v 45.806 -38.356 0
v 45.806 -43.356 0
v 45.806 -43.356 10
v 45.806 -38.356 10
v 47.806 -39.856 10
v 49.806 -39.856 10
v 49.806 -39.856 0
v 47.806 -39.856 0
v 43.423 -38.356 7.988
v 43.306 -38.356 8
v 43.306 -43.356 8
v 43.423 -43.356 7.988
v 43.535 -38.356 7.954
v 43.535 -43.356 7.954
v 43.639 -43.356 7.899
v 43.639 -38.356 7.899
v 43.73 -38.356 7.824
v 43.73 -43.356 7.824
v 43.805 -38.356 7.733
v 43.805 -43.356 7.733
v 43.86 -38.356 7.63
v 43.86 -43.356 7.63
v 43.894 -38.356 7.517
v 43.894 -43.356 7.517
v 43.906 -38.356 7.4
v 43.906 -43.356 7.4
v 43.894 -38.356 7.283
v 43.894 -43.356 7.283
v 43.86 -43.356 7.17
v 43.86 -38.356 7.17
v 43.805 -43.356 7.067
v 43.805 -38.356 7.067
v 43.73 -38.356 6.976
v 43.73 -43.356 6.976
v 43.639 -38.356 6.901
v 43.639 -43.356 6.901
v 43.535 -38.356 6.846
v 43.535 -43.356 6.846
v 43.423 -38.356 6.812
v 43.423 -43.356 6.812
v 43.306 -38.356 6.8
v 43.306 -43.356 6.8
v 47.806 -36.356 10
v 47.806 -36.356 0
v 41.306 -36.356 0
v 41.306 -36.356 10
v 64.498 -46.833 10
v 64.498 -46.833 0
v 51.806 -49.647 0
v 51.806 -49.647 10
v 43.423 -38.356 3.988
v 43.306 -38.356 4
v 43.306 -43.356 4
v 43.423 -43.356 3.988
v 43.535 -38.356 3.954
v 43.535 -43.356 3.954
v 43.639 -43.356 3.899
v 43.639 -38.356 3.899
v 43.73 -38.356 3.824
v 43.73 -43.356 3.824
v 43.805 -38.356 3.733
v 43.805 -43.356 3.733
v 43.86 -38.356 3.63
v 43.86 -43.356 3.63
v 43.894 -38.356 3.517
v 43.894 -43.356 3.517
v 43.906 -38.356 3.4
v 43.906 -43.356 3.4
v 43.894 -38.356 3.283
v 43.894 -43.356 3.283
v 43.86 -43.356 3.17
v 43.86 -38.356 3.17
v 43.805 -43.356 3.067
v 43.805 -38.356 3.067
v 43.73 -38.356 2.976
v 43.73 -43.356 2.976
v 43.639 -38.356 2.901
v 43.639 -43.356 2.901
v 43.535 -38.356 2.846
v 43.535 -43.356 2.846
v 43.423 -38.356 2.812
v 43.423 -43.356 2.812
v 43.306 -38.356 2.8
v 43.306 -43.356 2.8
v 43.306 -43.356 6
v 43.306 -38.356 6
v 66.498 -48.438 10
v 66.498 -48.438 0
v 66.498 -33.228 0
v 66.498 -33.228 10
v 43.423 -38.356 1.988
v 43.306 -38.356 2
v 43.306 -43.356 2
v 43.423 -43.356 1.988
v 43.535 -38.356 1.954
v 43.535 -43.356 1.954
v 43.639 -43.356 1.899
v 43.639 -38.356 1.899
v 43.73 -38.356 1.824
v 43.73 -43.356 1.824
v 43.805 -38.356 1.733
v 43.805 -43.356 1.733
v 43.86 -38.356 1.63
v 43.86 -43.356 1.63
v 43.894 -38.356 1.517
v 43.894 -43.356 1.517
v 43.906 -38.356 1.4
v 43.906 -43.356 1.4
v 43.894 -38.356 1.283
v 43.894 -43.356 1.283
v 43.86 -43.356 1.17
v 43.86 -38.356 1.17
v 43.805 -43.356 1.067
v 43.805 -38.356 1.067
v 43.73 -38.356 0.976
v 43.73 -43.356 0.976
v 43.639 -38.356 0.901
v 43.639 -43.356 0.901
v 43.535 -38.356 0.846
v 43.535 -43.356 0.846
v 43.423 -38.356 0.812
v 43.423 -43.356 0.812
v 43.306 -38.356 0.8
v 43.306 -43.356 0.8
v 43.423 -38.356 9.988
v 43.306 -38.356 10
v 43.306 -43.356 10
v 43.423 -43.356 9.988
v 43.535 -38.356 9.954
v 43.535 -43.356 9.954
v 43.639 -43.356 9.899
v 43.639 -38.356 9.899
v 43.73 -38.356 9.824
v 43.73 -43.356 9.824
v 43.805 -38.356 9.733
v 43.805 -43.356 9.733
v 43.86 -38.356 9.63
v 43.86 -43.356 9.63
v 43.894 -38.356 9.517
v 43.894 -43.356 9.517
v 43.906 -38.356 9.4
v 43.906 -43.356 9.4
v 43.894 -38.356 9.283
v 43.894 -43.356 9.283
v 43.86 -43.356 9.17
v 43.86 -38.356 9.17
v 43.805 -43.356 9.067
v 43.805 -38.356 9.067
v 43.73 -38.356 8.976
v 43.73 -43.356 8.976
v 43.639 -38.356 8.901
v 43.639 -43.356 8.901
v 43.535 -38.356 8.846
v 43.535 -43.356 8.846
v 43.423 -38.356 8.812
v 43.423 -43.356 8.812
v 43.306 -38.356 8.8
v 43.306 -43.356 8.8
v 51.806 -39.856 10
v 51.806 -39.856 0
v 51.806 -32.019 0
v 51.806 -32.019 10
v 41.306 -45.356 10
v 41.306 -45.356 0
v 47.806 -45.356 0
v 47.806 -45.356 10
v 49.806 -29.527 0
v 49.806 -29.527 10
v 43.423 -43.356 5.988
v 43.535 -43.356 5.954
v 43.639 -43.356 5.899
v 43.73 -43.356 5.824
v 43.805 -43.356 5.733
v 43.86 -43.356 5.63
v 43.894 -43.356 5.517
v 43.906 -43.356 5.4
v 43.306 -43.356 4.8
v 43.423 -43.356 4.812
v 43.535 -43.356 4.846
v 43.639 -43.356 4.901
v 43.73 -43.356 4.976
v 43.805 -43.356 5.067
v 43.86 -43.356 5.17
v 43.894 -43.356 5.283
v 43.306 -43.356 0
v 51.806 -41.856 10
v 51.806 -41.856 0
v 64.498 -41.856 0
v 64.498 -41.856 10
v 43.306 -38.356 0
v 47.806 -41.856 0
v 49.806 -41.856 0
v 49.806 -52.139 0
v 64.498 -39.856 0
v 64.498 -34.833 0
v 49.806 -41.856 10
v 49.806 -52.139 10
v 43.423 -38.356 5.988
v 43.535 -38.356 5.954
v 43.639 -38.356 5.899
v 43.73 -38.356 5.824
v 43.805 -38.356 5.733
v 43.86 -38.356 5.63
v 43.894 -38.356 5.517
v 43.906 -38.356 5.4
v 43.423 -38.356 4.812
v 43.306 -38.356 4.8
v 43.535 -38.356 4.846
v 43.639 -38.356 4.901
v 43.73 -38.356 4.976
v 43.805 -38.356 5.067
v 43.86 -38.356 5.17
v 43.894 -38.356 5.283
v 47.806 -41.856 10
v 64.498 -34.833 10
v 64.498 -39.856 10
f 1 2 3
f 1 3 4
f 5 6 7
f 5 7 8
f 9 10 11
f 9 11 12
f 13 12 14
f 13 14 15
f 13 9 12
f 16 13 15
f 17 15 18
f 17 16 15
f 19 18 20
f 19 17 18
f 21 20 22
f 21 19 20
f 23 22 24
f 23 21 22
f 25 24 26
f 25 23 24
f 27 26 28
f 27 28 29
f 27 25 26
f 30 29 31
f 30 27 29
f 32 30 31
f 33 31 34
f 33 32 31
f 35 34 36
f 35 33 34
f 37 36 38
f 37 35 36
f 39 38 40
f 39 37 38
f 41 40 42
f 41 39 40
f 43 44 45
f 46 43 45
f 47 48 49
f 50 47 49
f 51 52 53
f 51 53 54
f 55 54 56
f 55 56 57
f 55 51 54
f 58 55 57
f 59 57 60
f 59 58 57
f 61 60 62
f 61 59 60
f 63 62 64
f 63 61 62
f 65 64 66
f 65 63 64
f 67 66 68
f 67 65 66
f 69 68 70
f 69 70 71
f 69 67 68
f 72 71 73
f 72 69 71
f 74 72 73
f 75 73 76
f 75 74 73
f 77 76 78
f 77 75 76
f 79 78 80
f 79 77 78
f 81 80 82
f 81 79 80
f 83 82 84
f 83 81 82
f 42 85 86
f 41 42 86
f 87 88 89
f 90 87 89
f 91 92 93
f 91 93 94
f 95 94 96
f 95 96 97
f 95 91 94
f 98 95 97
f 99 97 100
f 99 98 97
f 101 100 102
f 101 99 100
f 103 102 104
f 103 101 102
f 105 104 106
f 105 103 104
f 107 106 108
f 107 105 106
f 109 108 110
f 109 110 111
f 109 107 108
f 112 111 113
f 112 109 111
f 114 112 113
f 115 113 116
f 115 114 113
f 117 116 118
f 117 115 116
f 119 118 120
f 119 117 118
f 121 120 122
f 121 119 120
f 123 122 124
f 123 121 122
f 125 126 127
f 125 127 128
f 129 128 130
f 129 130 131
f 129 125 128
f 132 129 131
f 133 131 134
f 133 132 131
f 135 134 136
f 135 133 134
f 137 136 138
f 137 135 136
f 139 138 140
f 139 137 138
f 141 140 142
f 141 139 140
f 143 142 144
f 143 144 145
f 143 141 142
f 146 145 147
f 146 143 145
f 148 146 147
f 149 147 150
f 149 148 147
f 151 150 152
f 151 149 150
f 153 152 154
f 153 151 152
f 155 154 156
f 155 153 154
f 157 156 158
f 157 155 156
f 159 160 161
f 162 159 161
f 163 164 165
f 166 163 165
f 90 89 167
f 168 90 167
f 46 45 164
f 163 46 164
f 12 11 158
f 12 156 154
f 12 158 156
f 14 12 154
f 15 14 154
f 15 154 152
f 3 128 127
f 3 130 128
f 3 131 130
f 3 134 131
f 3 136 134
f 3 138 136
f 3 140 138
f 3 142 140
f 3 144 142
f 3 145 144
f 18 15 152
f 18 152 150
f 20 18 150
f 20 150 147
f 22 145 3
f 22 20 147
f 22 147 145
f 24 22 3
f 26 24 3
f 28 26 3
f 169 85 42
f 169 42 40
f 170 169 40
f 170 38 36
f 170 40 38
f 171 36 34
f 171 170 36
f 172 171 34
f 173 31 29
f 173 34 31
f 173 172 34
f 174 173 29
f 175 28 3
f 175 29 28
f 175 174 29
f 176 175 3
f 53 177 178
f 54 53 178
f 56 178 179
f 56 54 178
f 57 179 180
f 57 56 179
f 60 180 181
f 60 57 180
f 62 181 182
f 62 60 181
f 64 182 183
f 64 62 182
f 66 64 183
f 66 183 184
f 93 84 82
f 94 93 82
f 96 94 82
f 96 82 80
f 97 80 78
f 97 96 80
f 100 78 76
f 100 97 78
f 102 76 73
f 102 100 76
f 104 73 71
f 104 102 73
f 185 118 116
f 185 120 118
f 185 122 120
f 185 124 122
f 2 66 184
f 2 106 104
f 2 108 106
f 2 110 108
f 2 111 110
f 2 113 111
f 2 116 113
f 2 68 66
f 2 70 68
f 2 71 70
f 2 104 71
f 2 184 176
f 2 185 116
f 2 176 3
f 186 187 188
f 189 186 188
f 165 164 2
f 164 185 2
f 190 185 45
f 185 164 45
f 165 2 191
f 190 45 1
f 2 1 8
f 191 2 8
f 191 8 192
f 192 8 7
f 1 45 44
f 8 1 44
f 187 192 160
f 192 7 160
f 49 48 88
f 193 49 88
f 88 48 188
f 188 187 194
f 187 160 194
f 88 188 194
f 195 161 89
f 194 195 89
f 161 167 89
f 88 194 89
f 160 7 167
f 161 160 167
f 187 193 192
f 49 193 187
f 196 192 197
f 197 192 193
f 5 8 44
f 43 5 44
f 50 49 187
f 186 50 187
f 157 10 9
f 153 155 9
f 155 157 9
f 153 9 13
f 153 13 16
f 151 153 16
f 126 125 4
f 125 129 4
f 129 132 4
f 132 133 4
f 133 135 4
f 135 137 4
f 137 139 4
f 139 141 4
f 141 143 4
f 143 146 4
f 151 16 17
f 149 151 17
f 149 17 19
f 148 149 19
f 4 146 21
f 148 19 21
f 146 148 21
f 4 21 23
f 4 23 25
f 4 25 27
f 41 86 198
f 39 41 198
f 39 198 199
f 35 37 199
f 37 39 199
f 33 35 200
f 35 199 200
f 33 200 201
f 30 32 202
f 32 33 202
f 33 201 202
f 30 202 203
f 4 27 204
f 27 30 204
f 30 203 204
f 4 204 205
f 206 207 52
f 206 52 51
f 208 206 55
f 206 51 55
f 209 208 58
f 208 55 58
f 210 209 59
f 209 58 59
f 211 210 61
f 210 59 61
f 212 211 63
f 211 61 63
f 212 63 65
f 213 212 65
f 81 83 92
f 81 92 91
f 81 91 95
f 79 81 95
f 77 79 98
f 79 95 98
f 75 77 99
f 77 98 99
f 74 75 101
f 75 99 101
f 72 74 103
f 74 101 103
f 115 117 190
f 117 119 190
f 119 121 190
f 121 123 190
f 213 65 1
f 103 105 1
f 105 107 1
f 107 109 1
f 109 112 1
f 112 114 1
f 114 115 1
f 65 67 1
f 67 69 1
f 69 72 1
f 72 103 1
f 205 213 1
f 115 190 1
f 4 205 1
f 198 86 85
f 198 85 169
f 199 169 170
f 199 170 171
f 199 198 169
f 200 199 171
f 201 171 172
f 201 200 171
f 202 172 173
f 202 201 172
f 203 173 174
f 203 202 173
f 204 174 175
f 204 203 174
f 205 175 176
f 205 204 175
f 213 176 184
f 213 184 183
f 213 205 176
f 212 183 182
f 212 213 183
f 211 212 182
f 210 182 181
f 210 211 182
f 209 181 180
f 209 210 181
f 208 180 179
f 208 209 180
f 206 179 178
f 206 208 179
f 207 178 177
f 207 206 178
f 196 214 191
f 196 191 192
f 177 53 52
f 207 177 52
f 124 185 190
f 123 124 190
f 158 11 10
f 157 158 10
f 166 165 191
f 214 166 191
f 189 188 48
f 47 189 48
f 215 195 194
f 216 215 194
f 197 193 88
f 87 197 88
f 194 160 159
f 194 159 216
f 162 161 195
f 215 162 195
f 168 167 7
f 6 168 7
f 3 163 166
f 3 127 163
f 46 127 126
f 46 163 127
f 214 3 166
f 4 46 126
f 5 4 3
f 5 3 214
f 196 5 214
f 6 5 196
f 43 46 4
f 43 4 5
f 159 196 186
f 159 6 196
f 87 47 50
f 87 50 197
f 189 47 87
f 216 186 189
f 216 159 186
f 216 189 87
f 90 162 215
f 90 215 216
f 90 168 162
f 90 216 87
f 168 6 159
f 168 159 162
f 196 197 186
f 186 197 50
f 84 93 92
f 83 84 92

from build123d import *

# Parameters (mm, degrees)
SKETCH1_W           = 2.5
SKETCH1_H           = 5
SKETCH1_W_2         = 12.691848092
SKETCH1_H_2         = 2
BOSS_EXTRUDE1_DEPTH = 10
BOSS_EXTRUDE2_DEPTH = 5
LPATTERN1_COUNT     = 5
LPATTERN1_PITCH     = 2


with BuildPart() as part:
    # Sketch1 → Boss-Extrude1 (new body)
    # profile 1 of 3: a face of its own
    with BuildSketch(Plane.XY):
        Polygon((49.805812864, -41.856488388), (49.805812864, -39.856488388), (47.805812864, -39.856488388), (47.805812864, -36.356488388), (41.305812864, -36.356488388), (41.305812864, -45.356488388), (47.805812864, -45.356488388), (47.805812864, -41.856488388), align=None)
        with Locations((44.555812864, -40.856488388)):
            Rectangle(SKETCH1_W, SKETCH1_H, mode=Mode.SUBTRACT)
    # profile 2 of 3: a face of its own
    with BuildSketch(Plane.XY):
        Polygon((66.497660956, -33.227883866), (49.805812864, -29.527390234), (49.805812864, -39.856488388), (49.805812864, -41.856488388), (49.805812864, -52.138716904), (66.497660956, -48.438223273), align=None)
        Polygon((51.805812864, -41.856488388), (51.805812864, -39.856488388), (51.805812864, -32.019338588), (64.497660956, -34.833053569), (64.497660956, -39.856488388), (64.497660956, -41.856488388), (64.497660956, -46.833053569), (51.805812864, -49.64676855), align=None, mode=Mode.SUBTRACT)
    # profile 3 of 3: a face of its own
    with BuildSketch(Plane.XY):
        with Locations((58.15173691, -40.856488388)):
            Rectangle(SKETCH1_W_2, SKETCH1_H_2)
    extrude(amount=BOSS_EXTRUDE1_DEPTH)

    # Sketch2 → Boss-Extrude2 (add)
    with BuildSketch(Plane.XZ.offset(38.356488388)):
        with BuildLine():
            Line((43.305812864, 8.8), (43.305812864, 10))
            ThreePointArc((43.305812864, 10), (43.905812864, 9.4), (43.305812864, 8.8))
        make_face()
    boss_extrude2 = extrude(amount=BOSS_EXTRUDE2_DEPTH)

    # LPattern1: Boss-Extrude2 ×5
    with Locations(*[(0, 0, -i * LPATTERN1_PITCH) for i in range(1, LPATTERN1_COUNT)]):
        add(boss_extrude2)


solid = part.part
